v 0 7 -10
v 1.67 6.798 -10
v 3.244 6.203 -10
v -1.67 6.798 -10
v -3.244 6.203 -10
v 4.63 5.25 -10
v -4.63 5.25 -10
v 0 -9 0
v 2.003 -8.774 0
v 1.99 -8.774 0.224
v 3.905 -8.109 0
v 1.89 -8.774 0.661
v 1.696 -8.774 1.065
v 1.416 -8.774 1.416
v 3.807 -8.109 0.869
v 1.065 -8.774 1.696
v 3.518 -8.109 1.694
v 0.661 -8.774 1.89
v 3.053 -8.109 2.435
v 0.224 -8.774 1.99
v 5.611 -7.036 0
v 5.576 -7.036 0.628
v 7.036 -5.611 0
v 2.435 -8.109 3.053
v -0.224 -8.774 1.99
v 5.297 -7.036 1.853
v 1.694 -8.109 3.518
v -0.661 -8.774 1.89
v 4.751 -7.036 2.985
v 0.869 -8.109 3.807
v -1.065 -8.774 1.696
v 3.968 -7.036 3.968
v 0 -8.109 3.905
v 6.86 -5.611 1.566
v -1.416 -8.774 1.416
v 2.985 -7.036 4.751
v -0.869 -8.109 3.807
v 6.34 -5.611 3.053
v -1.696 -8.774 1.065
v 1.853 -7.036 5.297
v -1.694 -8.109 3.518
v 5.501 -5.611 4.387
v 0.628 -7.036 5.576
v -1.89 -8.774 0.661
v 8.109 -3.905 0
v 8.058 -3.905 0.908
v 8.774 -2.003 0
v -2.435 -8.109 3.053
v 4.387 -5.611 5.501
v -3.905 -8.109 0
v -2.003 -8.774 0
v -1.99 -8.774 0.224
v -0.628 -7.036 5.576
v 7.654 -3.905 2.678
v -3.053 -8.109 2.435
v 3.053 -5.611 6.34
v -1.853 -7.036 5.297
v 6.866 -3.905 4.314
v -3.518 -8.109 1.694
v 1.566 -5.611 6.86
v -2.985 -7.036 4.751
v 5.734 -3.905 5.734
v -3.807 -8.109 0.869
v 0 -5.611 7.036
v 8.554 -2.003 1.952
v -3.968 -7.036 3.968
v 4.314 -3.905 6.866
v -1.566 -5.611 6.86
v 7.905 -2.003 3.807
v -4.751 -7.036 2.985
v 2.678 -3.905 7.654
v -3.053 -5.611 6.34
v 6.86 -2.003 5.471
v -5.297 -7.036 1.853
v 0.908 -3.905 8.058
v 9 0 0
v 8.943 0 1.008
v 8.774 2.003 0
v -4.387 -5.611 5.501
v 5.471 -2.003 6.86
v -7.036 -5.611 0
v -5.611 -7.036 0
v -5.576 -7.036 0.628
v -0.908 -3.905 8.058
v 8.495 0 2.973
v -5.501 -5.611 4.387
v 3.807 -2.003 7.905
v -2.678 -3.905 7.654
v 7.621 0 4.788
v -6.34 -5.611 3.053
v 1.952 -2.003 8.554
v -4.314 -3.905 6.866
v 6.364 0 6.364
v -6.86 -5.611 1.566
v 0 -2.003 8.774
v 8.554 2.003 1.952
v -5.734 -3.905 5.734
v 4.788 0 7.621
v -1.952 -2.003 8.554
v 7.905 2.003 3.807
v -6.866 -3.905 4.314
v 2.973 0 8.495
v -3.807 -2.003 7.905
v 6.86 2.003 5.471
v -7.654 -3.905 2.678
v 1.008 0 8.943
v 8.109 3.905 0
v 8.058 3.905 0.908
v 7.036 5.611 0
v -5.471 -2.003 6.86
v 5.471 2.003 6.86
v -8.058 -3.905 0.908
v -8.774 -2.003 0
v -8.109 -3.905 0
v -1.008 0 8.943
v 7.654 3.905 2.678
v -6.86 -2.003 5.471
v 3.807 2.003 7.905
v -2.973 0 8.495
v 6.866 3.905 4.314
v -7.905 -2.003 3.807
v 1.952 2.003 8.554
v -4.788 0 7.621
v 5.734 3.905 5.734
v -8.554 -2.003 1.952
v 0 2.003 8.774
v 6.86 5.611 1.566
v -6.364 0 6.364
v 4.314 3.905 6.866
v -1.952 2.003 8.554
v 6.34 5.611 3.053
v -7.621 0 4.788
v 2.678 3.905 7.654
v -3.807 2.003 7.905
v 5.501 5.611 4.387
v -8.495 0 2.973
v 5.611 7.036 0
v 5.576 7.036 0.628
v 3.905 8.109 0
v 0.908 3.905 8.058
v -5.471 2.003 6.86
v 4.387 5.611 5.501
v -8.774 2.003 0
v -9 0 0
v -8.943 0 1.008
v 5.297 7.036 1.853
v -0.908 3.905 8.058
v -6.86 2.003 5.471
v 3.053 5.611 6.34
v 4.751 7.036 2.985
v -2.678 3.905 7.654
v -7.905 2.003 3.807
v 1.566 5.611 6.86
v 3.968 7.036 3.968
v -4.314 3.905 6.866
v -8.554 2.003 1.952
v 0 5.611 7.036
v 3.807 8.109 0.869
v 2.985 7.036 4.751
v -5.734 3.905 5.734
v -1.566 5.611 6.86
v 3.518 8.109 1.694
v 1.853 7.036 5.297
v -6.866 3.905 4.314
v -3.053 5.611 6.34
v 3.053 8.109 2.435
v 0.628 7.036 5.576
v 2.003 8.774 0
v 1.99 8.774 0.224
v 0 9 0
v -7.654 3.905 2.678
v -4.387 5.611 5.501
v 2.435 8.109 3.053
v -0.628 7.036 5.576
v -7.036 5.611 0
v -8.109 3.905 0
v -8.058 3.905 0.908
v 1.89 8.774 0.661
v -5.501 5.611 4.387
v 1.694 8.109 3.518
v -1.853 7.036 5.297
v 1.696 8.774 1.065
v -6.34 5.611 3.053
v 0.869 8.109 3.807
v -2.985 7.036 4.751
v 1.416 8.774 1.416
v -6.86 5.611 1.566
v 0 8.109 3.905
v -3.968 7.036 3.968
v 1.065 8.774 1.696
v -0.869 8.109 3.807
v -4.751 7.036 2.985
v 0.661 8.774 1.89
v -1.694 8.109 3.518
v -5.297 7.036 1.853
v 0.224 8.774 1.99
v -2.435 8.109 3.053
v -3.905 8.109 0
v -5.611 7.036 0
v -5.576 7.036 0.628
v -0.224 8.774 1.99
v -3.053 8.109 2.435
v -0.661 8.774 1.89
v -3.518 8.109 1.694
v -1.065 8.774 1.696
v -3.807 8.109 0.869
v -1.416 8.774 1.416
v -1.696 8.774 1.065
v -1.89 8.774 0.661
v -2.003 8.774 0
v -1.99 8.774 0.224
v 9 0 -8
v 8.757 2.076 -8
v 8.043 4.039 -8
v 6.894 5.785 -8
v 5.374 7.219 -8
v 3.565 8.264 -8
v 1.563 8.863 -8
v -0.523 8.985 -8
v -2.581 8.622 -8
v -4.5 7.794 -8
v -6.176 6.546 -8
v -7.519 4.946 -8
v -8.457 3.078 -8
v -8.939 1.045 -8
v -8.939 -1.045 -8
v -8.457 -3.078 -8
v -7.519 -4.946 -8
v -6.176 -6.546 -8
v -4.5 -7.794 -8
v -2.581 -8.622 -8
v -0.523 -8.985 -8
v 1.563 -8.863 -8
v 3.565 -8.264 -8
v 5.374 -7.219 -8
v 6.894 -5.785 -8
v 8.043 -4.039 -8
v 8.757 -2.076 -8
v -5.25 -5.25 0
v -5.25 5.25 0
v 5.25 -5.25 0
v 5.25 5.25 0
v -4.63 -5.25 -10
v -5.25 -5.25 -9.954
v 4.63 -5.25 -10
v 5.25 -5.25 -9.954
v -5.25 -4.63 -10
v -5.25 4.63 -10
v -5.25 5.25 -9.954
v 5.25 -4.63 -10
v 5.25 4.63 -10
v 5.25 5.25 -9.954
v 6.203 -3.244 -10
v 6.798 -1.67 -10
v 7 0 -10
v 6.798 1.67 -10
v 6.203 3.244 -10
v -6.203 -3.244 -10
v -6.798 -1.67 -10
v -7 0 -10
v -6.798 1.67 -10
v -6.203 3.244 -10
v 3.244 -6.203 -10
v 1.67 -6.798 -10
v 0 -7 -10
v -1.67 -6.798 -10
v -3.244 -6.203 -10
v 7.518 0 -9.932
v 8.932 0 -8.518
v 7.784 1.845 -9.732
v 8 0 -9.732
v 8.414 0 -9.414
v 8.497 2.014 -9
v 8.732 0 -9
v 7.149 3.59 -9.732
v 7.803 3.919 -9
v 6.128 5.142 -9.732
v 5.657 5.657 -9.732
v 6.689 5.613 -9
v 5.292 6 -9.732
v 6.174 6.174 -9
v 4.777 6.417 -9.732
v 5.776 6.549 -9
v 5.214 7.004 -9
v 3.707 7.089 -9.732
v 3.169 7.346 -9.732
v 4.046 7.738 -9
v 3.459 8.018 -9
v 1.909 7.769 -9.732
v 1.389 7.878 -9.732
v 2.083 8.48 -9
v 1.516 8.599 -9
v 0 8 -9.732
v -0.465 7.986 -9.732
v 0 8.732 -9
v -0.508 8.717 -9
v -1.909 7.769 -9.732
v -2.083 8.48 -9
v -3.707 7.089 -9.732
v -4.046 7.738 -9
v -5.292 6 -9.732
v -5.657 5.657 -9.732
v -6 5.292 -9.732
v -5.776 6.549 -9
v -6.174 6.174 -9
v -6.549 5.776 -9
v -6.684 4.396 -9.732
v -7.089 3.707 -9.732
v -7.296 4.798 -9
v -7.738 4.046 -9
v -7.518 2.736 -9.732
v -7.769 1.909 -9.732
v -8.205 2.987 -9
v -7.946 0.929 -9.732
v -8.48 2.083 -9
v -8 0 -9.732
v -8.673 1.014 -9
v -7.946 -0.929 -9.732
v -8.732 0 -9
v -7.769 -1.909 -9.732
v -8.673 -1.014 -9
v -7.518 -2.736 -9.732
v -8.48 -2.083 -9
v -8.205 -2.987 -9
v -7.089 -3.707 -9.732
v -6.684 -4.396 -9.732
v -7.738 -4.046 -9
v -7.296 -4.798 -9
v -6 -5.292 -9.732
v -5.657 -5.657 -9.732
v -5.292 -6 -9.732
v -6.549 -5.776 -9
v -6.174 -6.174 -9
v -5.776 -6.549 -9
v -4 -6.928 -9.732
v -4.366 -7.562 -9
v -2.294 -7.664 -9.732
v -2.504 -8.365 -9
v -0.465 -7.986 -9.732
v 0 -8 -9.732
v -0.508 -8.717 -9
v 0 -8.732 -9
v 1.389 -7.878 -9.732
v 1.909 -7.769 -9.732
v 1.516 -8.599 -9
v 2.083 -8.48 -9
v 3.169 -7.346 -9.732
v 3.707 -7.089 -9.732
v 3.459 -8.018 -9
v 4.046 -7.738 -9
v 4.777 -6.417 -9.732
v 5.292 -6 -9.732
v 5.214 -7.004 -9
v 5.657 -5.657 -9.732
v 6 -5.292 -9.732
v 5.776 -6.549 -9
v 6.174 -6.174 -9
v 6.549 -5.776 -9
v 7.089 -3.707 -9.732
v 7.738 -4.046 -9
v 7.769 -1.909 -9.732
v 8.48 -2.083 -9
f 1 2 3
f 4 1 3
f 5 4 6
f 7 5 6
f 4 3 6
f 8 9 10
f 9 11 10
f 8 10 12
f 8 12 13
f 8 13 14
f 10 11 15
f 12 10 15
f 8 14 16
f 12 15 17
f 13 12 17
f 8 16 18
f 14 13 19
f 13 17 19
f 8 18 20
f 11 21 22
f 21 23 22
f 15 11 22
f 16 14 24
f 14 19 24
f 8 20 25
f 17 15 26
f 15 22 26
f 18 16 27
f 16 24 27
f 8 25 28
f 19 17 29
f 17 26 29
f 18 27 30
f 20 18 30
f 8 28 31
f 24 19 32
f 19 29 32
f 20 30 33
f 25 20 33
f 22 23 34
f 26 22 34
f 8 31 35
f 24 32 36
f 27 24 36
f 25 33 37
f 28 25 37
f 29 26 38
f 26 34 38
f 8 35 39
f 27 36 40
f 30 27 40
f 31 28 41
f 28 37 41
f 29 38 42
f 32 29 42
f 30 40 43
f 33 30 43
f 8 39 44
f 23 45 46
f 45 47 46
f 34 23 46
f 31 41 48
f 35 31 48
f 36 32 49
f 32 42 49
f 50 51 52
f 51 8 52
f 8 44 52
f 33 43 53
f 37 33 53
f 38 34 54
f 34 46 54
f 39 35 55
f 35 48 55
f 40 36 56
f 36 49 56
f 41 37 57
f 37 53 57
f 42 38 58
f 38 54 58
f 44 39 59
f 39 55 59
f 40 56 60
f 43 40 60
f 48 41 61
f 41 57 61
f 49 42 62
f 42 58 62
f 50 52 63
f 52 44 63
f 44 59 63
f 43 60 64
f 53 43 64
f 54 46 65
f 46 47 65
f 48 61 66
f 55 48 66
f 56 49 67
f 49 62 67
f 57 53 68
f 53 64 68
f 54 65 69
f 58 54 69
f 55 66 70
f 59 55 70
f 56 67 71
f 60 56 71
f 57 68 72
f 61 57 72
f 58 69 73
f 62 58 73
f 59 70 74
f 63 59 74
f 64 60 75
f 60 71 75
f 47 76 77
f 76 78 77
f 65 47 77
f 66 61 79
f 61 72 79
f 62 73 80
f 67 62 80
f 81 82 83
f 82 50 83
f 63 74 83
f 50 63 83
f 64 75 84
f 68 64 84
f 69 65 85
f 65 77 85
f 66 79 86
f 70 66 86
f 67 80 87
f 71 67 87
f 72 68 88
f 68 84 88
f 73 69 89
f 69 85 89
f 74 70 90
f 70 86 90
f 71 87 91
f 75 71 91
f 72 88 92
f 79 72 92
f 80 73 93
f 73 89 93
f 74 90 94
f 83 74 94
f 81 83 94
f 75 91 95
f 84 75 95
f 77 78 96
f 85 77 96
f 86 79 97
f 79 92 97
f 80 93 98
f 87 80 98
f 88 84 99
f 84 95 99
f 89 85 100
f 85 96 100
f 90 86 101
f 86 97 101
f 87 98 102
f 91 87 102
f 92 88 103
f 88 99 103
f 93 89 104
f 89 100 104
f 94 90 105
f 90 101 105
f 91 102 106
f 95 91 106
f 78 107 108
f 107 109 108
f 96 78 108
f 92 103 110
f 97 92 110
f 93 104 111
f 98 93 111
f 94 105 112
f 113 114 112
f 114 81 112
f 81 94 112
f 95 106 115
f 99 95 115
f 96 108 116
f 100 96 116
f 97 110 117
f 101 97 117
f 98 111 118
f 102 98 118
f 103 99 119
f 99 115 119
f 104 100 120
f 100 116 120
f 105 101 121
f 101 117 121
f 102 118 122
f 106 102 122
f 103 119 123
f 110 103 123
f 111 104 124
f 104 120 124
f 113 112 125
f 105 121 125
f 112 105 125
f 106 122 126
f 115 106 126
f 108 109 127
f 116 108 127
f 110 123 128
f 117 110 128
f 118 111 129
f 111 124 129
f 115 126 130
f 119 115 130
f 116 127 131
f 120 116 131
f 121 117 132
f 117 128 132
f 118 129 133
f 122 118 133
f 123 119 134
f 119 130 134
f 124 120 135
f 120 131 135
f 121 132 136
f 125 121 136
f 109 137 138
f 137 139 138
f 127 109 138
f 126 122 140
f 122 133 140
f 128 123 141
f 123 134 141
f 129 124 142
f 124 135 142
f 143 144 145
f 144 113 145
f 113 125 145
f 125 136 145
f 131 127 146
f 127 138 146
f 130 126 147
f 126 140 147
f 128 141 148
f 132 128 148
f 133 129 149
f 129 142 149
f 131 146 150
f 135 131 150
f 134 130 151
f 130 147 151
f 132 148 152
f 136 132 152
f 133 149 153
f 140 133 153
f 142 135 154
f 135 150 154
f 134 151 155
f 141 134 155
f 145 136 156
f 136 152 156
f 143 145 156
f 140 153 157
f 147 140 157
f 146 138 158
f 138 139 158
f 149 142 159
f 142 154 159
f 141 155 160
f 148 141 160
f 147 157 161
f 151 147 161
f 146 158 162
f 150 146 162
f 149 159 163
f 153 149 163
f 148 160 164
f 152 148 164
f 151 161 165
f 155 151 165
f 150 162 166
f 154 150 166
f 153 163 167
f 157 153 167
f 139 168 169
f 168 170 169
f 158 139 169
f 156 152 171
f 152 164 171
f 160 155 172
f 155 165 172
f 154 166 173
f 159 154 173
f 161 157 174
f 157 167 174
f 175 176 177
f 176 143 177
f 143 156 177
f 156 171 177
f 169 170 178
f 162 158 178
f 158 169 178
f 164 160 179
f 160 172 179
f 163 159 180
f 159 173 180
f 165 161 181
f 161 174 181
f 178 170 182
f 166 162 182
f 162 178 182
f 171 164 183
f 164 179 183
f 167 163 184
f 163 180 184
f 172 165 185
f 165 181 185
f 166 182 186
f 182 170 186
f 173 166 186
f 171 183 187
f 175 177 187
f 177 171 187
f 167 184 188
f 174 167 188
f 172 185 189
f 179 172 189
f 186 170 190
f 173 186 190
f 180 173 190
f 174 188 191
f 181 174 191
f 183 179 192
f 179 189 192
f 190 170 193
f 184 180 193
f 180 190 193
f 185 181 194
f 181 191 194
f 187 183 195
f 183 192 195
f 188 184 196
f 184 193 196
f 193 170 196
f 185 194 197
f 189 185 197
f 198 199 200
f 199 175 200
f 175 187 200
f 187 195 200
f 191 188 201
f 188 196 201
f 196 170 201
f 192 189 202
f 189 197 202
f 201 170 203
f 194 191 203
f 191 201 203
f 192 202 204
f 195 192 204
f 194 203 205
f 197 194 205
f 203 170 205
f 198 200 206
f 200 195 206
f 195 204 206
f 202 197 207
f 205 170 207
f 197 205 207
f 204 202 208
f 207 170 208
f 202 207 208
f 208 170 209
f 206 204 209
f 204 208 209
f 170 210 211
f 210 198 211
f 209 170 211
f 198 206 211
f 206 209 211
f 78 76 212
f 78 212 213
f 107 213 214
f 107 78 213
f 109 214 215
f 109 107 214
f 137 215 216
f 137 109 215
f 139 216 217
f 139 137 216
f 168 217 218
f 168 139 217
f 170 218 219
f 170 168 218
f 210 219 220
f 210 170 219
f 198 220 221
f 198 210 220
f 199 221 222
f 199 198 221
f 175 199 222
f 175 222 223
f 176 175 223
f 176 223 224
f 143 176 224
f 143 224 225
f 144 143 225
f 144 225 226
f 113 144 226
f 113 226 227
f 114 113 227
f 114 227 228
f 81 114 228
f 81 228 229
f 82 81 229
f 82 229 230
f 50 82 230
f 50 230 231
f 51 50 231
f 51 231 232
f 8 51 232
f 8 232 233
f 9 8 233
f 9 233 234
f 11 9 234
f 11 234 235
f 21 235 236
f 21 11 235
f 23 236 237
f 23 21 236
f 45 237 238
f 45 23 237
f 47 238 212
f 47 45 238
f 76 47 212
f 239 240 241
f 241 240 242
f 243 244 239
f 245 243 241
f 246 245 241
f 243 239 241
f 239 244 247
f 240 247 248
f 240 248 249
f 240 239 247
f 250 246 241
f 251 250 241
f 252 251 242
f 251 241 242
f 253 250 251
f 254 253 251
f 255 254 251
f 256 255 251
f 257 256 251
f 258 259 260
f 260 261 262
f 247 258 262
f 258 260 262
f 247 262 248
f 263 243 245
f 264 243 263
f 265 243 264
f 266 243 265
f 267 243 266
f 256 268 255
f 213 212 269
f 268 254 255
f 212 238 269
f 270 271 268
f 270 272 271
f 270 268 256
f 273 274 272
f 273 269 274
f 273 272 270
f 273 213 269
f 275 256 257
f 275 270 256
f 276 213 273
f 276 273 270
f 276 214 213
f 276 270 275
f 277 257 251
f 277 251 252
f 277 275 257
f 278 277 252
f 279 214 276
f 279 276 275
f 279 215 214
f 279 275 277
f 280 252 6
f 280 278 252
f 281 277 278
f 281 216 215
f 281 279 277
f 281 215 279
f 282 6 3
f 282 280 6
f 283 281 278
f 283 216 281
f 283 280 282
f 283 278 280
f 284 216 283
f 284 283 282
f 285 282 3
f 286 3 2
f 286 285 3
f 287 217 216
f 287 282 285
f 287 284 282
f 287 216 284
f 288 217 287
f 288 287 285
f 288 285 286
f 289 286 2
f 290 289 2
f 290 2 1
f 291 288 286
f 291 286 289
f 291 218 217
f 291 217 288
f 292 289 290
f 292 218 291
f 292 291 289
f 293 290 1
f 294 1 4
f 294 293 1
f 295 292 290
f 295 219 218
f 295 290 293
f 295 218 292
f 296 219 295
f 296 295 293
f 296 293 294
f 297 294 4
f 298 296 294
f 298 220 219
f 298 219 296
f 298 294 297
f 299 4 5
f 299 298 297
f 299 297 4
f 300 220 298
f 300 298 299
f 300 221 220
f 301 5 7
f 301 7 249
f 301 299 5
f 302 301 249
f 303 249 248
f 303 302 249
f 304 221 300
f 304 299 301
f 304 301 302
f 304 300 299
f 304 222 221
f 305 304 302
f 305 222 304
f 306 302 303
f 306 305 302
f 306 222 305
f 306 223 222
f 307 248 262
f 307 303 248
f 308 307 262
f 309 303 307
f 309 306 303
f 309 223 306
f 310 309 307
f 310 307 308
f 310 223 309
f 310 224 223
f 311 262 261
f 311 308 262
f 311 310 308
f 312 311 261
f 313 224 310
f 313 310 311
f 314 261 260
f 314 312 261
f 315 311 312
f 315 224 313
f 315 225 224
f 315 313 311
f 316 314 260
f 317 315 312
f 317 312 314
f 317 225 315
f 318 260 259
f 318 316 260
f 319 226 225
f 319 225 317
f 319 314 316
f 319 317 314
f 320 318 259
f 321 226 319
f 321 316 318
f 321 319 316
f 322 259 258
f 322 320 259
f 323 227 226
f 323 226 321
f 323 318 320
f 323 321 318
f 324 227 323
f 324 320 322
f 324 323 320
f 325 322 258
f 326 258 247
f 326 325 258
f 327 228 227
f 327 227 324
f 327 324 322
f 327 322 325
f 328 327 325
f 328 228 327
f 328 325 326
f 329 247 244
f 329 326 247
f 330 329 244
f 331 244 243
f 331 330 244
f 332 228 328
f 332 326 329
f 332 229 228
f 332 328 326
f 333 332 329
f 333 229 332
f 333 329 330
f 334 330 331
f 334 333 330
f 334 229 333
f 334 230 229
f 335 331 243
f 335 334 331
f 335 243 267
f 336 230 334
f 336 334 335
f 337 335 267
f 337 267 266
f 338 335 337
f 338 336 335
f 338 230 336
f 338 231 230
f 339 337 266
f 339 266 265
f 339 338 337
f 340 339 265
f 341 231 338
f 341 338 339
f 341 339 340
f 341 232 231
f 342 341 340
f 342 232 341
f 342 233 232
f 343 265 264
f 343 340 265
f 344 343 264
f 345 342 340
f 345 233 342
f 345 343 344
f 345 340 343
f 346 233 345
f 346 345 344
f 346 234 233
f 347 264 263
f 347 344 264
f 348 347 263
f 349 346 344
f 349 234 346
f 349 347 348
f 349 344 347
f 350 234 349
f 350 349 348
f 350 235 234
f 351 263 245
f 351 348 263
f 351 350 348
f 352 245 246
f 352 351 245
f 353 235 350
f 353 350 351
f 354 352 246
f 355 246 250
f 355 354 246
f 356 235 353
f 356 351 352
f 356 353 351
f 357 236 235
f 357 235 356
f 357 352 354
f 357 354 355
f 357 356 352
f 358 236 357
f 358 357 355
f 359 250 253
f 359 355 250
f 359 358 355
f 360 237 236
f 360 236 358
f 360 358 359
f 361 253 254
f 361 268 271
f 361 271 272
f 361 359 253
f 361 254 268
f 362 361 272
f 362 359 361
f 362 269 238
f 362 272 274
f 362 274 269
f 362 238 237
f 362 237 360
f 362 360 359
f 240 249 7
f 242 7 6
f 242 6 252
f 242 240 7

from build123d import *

# Parameters (mm, degrees)
SKETCH_3_R          = 9
EXTRUDE_1_DEPTH     = 10
SKETCH_2_W          = 10.5
SKETCH_2_H          = 10.5
CUT_EXTRUDE_1_DEPTH = 10
FILLET_1_R          = 2


with BuildPart() as part:
    # 草图1 → 旋转1 (revolve)
    with BuildSketch(Plane.XY):
        with BuildLine():
            Line((0, 9), (0, -9))
            ThreePointArc((0, -9), (9, 0), (0, 9))
        make_face()
    revolve(axis=Axis((0, 9, 0), (0, -1, 0)))

    # 草图3 → 凸台-拉伸1 (add)
    with BuildSketch(Plane.XY):
        Circle(SKETCH_3_R)
    extrude(amount=-EXTRUDE_1_DEPTH)

    # 草图2 → 切除-拉伸1 (cut)
    with BuildSketch(Plane.XY):
        Rectangle(SKETCH_2_W, SKETCH_2_H)
    extrude(amount=-CUT_EXTRUDE_1_DEPTH, mode=Mode.SUBTRACT)

    # 圆角1
    # the kernel refuses this fillet: 2 mm, written as the material it takes off along each edge
    with BuildSketch(Plane(origin=(0, 0, -10), x_dir=(1, 0, 0), z_dir=(0, -1, 0))) as fillet_1_piece_1:
        with BuildLine():
            CenterArc((9 - FILLET_1_R, FILLET_1_R), FILLET_1_R, 270, 90)
            Line((9 - FILLET_1_R, 0), (9, 0))
            Line((9, 0), (9, FILLET_1_R))
        make_face()
    revolve(axis=Axis((0, 0, -10), (0, 0, 1)), mode=Mode.SUBTRACT)


solid = part.part
